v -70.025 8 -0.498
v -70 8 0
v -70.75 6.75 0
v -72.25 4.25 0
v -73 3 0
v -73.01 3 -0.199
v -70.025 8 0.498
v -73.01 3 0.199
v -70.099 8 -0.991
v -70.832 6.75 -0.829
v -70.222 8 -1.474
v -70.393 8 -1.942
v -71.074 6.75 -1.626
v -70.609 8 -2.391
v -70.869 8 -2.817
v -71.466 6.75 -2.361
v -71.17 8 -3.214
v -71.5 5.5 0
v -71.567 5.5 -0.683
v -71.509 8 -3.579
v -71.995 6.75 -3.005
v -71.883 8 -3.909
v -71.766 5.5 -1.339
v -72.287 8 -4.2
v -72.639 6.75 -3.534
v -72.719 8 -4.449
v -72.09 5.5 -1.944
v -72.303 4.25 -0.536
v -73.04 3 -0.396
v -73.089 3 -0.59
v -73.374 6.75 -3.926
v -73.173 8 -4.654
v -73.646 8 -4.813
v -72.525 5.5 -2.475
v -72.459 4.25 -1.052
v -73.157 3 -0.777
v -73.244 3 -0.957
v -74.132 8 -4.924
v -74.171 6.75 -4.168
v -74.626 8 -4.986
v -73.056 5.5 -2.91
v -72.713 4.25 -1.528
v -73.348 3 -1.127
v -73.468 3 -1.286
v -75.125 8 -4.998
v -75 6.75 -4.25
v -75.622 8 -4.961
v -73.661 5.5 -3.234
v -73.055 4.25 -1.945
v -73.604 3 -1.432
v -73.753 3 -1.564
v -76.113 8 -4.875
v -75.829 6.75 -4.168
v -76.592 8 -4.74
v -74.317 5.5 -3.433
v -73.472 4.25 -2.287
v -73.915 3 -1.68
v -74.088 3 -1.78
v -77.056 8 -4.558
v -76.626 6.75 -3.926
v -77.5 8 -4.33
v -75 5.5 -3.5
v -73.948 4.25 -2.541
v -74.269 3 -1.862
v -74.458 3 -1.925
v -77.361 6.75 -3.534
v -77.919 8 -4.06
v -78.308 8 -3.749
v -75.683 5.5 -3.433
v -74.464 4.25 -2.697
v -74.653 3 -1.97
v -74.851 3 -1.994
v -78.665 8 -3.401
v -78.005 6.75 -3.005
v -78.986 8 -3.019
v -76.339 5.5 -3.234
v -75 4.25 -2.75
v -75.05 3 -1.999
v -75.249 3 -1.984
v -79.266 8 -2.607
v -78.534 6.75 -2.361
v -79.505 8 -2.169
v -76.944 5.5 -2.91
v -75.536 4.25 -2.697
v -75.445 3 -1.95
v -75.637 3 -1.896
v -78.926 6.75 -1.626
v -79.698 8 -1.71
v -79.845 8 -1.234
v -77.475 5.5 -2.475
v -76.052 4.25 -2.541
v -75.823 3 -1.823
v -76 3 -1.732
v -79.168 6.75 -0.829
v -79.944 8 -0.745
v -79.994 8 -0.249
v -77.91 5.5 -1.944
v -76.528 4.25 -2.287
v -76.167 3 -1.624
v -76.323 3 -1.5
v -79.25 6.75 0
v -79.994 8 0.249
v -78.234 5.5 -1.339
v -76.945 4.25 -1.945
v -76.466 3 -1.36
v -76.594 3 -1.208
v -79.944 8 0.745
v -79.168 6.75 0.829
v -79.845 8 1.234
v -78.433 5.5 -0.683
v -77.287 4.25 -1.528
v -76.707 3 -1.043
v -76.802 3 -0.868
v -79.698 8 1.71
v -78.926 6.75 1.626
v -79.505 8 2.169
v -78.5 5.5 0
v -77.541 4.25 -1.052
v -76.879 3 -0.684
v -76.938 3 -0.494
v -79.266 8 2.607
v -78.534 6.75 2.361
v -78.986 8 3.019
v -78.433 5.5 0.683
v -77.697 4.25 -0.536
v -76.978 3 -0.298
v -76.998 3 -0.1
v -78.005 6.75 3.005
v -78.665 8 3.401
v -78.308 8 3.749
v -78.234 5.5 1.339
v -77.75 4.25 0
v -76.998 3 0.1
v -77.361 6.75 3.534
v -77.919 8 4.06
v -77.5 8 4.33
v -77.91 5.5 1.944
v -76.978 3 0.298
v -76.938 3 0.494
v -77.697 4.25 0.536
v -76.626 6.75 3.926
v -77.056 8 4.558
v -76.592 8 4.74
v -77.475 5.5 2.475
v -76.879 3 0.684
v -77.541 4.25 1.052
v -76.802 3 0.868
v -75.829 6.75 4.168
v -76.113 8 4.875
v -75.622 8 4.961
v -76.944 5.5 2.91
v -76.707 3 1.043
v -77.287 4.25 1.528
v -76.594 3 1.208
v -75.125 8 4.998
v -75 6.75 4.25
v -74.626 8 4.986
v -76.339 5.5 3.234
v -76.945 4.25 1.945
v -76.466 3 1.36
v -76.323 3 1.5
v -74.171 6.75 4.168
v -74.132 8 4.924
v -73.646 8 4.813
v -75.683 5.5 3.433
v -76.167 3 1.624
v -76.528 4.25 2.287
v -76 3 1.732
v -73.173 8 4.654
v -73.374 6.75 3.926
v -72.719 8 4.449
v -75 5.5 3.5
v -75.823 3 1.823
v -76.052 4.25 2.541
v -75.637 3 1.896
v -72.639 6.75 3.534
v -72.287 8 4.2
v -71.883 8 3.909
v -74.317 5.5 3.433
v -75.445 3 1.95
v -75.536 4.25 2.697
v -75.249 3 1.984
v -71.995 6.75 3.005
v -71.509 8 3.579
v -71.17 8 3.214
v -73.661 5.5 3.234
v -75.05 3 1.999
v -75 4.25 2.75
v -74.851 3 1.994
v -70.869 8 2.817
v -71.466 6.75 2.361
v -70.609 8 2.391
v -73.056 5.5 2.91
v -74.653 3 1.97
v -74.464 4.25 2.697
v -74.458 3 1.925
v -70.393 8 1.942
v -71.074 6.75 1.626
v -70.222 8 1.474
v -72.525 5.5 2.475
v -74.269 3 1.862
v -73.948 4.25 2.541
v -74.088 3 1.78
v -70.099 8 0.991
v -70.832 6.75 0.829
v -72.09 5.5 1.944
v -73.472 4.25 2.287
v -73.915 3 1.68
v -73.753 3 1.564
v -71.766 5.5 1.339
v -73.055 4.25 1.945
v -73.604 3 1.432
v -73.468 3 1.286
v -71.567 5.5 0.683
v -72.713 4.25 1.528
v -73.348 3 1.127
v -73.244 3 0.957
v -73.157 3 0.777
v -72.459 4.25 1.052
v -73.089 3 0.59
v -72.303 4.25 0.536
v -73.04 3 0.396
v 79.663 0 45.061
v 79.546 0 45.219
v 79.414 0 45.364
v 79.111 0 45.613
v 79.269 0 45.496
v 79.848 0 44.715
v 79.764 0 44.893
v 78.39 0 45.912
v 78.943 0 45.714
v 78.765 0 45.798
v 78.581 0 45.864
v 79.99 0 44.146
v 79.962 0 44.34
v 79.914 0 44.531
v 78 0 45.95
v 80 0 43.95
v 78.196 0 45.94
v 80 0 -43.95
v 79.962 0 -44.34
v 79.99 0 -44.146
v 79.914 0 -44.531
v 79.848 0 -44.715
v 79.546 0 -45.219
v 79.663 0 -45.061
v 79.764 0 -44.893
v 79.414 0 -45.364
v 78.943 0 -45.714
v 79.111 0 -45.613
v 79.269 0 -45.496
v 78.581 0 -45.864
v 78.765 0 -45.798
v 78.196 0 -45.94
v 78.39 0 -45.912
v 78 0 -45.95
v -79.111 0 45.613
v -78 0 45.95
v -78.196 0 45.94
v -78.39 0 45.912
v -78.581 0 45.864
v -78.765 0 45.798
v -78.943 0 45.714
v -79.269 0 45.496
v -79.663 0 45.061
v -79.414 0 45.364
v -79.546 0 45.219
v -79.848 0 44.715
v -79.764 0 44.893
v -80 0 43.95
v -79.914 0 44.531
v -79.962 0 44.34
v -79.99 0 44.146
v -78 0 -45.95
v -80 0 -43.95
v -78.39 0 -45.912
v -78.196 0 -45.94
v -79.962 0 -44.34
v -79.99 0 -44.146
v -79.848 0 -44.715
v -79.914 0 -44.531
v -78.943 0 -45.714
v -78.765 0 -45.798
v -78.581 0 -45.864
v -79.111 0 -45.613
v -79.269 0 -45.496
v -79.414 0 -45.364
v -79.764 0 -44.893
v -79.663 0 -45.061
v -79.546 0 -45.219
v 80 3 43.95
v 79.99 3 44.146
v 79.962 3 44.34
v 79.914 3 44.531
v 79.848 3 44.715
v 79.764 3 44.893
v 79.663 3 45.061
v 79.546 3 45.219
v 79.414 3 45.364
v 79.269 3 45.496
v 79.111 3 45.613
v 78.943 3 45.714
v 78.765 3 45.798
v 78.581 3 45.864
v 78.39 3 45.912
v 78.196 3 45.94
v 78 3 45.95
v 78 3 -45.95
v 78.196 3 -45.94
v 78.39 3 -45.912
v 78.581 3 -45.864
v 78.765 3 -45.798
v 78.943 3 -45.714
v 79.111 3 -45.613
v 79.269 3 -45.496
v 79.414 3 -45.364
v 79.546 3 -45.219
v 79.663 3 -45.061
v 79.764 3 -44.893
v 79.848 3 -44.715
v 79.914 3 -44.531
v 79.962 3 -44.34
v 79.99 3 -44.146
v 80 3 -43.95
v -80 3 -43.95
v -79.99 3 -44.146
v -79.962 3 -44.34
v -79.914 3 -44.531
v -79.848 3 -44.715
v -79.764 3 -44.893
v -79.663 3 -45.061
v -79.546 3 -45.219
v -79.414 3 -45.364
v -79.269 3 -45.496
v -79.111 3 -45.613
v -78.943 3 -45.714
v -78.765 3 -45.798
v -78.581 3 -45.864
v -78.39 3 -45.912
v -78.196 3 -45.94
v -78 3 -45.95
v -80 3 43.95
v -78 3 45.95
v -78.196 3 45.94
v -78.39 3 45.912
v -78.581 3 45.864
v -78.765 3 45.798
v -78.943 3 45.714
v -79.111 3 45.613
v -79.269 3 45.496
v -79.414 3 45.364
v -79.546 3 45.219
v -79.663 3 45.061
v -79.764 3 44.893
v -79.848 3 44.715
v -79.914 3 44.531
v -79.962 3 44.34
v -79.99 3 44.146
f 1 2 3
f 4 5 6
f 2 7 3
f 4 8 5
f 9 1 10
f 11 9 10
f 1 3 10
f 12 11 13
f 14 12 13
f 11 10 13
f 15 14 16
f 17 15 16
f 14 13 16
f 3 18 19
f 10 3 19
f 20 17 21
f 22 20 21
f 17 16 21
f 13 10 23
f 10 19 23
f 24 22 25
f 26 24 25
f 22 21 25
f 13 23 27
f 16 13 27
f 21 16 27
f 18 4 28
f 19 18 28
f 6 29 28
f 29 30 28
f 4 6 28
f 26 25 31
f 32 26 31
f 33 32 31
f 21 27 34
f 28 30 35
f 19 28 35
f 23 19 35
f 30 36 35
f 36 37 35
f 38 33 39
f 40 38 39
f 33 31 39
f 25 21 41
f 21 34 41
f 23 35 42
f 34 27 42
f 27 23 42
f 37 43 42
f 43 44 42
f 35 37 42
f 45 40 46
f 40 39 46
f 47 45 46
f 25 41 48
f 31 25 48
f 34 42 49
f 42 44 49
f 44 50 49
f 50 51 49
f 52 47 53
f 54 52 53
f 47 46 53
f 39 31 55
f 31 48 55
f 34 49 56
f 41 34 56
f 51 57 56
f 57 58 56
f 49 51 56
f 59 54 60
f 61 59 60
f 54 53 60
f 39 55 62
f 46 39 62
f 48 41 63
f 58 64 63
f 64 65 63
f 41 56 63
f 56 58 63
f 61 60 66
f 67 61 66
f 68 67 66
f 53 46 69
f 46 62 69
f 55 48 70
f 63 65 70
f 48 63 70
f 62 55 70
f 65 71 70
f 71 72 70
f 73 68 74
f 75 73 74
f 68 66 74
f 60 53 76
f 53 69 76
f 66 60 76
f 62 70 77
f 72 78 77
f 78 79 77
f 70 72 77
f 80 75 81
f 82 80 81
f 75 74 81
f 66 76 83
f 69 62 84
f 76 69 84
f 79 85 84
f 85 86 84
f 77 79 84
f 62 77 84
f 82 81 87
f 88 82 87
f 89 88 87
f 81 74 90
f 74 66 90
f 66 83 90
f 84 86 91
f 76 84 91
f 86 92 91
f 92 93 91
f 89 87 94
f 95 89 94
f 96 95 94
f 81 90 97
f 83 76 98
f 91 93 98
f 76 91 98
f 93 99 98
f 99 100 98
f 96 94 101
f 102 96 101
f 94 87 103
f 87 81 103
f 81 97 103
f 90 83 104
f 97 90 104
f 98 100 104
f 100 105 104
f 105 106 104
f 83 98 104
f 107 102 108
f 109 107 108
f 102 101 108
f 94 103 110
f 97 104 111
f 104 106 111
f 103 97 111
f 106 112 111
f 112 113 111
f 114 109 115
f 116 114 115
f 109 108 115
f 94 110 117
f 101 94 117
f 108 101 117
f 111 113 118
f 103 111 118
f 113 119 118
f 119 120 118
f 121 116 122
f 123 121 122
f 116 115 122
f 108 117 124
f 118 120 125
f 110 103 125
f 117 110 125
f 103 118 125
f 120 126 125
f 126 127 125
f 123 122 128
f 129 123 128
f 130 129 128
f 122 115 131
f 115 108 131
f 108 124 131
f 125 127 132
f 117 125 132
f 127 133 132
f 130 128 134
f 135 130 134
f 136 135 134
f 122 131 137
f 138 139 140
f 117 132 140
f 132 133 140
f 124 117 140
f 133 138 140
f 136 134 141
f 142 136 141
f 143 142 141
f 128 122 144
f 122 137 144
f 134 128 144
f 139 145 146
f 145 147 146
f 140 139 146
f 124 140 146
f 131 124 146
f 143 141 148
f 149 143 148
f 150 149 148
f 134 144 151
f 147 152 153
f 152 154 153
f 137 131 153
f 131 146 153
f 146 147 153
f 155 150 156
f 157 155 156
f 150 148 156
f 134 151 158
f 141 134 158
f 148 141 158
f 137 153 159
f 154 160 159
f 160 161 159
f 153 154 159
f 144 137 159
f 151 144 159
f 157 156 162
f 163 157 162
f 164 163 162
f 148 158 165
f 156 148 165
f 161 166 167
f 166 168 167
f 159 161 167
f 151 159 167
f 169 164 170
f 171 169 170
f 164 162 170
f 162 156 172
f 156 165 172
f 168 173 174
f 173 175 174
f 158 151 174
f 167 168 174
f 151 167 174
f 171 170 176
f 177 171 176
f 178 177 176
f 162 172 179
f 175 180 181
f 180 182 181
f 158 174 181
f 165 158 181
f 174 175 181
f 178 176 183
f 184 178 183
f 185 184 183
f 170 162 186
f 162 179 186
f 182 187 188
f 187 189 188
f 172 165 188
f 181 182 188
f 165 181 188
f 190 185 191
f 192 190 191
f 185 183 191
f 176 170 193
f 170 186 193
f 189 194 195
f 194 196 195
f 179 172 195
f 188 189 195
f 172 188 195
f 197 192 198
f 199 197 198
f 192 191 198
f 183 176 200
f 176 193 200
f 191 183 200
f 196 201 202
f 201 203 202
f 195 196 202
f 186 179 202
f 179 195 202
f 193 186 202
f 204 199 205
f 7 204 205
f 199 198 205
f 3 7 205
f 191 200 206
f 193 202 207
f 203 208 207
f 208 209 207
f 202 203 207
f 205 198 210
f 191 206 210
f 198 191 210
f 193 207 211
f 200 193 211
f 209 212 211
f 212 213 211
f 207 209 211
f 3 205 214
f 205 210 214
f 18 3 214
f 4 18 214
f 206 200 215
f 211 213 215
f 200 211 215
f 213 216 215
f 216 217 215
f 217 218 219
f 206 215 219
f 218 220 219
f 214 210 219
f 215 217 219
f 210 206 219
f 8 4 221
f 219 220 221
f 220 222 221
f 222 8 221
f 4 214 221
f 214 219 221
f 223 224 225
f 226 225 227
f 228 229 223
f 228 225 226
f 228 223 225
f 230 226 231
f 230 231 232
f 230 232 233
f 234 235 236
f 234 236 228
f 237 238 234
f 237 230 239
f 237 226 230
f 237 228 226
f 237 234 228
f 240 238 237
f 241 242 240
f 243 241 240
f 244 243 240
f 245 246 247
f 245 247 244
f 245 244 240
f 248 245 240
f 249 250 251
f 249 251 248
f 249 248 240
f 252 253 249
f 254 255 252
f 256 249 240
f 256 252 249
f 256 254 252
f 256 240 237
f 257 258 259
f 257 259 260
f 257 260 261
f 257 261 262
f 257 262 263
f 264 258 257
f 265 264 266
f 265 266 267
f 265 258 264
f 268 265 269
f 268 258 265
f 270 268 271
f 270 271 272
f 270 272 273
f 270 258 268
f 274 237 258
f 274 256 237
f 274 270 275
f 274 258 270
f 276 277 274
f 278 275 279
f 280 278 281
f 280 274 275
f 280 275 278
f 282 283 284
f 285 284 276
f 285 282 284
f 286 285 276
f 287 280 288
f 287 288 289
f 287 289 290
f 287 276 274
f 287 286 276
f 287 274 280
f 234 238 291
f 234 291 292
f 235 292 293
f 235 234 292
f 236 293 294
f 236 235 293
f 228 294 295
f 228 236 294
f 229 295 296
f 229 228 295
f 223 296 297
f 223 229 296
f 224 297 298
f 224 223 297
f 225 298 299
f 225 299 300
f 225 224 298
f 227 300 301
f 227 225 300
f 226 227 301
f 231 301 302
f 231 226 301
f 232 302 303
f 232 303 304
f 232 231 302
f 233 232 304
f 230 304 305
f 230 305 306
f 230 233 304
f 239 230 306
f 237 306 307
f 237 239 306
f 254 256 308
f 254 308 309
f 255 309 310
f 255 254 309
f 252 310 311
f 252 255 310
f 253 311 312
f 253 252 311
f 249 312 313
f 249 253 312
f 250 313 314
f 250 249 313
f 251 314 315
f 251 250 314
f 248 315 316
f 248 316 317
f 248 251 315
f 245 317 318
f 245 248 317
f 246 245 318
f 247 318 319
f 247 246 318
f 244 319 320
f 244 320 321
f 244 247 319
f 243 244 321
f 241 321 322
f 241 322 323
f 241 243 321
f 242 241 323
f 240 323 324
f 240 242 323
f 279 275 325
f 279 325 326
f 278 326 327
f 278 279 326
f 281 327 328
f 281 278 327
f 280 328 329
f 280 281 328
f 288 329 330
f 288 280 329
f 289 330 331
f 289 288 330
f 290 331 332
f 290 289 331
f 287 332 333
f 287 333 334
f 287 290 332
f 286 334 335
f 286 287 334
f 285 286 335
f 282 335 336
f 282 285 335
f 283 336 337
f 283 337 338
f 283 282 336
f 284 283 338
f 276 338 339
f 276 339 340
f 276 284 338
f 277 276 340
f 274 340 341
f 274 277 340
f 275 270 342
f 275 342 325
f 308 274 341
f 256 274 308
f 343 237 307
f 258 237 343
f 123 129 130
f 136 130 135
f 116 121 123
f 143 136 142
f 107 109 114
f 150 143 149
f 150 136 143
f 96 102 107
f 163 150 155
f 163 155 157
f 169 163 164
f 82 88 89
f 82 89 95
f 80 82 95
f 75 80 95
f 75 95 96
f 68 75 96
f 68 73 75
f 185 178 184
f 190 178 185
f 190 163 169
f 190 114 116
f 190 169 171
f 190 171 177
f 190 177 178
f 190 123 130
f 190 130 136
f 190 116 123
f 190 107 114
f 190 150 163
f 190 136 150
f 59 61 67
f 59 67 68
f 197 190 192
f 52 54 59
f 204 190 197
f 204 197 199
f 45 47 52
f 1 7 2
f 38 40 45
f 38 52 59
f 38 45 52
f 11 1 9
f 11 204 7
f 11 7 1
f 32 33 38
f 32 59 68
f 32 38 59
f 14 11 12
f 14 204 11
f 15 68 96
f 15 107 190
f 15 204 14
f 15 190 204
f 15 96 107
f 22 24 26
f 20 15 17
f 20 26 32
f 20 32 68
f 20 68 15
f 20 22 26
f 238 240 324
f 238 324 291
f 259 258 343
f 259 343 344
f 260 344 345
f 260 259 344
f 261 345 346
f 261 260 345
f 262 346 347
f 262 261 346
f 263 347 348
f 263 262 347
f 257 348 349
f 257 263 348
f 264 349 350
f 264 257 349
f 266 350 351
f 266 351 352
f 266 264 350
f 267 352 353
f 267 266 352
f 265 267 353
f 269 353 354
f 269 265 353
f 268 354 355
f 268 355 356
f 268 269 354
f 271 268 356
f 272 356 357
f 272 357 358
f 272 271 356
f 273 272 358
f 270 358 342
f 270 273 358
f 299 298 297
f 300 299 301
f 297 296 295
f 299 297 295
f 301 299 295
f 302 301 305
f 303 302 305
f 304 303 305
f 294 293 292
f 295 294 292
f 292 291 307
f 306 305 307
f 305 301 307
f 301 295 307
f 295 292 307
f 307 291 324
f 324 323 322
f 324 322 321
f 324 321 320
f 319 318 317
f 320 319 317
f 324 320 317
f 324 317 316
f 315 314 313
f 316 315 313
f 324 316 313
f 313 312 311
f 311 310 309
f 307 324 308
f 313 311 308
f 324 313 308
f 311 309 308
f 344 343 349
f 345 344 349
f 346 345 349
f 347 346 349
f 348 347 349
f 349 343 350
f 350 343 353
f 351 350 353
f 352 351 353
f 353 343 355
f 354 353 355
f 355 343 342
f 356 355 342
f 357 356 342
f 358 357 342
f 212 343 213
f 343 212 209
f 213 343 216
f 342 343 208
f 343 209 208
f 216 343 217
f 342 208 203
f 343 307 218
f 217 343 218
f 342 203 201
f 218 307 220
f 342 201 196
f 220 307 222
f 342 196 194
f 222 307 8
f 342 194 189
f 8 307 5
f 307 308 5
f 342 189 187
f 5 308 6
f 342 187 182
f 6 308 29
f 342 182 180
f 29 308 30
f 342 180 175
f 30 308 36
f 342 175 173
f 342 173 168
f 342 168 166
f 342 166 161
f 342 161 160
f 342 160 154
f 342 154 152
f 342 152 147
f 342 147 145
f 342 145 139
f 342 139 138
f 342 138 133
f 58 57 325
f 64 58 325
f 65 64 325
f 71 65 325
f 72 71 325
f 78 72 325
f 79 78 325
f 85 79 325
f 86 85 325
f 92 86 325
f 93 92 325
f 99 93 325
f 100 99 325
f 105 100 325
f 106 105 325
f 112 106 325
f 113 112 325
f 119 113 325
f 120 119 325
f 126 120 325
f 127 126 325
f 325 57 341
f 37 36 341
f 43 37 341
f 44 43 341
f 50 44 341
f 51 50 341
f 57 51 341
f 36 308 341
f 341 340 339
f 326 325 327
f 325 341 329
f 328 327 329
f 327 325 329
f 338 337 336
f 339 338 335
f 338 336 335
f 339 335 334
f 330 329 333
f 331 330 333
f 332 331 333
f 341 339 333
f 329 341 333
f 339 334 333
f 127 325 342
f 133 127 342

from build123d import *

# Parameters (mm, degrees)
BOSS_EXTRUDE3_DEPTH = 3
SKETCH3_R           = 5
SKETCH2_R           = 2


with BuildPart() as part:
    # Sketch1 → Boss-Extrude3 (new body)
    with BuildSketch(Plane(origin=(0, 0, 0), x_dir=(1, 0, 0), z_dir=(0, 1, 0))):
        with BuildLine():
            Line((-78, 45.95), (78, 45.95))
            ThreePointArc((78, 45.95), (79.414213562, 45.364213562), (80, 43.95))
            Line((80, 43.95), (80, -43.95))
            ThreePointArc((80, -43.95), (79.414213562, -45.364213562), (78, -45.95))
            Line((78, -45.95), (-78, -45.95))
            ThreePointArc((-78, -45.95), (-79.414213562, -45.364213562), (-80, -43.95))
            Line((-80, -43.95), (-80, 43.95))
            ThreePointArc((-80, 43.95), (-79.414213562, 45.364213562), (-78, 45.95))
        make_face()
    extrude(amount=BOSS_EXTRUDE3_DEPTH)

    # Sketch3 → Loft1 section 0
    with BuildSketch(Plane(origin=(0, 8, 0), x_dir=(1, 0, 0), z_dir=(0, 1, 0))):
        with Locations((-75, 0)):
            Circle(SKETCH3_R)
    # Sketch2 → Loft1 section 1
    with BuildSketch(Plane(origin=(0, 3, 0), x_dir=(1, 0, 0), z_dir=(0, 1, 0))):
        with Locations((-75, 0)):
            Circle(SKETCH2_R)
    loft()


solid = part.part
